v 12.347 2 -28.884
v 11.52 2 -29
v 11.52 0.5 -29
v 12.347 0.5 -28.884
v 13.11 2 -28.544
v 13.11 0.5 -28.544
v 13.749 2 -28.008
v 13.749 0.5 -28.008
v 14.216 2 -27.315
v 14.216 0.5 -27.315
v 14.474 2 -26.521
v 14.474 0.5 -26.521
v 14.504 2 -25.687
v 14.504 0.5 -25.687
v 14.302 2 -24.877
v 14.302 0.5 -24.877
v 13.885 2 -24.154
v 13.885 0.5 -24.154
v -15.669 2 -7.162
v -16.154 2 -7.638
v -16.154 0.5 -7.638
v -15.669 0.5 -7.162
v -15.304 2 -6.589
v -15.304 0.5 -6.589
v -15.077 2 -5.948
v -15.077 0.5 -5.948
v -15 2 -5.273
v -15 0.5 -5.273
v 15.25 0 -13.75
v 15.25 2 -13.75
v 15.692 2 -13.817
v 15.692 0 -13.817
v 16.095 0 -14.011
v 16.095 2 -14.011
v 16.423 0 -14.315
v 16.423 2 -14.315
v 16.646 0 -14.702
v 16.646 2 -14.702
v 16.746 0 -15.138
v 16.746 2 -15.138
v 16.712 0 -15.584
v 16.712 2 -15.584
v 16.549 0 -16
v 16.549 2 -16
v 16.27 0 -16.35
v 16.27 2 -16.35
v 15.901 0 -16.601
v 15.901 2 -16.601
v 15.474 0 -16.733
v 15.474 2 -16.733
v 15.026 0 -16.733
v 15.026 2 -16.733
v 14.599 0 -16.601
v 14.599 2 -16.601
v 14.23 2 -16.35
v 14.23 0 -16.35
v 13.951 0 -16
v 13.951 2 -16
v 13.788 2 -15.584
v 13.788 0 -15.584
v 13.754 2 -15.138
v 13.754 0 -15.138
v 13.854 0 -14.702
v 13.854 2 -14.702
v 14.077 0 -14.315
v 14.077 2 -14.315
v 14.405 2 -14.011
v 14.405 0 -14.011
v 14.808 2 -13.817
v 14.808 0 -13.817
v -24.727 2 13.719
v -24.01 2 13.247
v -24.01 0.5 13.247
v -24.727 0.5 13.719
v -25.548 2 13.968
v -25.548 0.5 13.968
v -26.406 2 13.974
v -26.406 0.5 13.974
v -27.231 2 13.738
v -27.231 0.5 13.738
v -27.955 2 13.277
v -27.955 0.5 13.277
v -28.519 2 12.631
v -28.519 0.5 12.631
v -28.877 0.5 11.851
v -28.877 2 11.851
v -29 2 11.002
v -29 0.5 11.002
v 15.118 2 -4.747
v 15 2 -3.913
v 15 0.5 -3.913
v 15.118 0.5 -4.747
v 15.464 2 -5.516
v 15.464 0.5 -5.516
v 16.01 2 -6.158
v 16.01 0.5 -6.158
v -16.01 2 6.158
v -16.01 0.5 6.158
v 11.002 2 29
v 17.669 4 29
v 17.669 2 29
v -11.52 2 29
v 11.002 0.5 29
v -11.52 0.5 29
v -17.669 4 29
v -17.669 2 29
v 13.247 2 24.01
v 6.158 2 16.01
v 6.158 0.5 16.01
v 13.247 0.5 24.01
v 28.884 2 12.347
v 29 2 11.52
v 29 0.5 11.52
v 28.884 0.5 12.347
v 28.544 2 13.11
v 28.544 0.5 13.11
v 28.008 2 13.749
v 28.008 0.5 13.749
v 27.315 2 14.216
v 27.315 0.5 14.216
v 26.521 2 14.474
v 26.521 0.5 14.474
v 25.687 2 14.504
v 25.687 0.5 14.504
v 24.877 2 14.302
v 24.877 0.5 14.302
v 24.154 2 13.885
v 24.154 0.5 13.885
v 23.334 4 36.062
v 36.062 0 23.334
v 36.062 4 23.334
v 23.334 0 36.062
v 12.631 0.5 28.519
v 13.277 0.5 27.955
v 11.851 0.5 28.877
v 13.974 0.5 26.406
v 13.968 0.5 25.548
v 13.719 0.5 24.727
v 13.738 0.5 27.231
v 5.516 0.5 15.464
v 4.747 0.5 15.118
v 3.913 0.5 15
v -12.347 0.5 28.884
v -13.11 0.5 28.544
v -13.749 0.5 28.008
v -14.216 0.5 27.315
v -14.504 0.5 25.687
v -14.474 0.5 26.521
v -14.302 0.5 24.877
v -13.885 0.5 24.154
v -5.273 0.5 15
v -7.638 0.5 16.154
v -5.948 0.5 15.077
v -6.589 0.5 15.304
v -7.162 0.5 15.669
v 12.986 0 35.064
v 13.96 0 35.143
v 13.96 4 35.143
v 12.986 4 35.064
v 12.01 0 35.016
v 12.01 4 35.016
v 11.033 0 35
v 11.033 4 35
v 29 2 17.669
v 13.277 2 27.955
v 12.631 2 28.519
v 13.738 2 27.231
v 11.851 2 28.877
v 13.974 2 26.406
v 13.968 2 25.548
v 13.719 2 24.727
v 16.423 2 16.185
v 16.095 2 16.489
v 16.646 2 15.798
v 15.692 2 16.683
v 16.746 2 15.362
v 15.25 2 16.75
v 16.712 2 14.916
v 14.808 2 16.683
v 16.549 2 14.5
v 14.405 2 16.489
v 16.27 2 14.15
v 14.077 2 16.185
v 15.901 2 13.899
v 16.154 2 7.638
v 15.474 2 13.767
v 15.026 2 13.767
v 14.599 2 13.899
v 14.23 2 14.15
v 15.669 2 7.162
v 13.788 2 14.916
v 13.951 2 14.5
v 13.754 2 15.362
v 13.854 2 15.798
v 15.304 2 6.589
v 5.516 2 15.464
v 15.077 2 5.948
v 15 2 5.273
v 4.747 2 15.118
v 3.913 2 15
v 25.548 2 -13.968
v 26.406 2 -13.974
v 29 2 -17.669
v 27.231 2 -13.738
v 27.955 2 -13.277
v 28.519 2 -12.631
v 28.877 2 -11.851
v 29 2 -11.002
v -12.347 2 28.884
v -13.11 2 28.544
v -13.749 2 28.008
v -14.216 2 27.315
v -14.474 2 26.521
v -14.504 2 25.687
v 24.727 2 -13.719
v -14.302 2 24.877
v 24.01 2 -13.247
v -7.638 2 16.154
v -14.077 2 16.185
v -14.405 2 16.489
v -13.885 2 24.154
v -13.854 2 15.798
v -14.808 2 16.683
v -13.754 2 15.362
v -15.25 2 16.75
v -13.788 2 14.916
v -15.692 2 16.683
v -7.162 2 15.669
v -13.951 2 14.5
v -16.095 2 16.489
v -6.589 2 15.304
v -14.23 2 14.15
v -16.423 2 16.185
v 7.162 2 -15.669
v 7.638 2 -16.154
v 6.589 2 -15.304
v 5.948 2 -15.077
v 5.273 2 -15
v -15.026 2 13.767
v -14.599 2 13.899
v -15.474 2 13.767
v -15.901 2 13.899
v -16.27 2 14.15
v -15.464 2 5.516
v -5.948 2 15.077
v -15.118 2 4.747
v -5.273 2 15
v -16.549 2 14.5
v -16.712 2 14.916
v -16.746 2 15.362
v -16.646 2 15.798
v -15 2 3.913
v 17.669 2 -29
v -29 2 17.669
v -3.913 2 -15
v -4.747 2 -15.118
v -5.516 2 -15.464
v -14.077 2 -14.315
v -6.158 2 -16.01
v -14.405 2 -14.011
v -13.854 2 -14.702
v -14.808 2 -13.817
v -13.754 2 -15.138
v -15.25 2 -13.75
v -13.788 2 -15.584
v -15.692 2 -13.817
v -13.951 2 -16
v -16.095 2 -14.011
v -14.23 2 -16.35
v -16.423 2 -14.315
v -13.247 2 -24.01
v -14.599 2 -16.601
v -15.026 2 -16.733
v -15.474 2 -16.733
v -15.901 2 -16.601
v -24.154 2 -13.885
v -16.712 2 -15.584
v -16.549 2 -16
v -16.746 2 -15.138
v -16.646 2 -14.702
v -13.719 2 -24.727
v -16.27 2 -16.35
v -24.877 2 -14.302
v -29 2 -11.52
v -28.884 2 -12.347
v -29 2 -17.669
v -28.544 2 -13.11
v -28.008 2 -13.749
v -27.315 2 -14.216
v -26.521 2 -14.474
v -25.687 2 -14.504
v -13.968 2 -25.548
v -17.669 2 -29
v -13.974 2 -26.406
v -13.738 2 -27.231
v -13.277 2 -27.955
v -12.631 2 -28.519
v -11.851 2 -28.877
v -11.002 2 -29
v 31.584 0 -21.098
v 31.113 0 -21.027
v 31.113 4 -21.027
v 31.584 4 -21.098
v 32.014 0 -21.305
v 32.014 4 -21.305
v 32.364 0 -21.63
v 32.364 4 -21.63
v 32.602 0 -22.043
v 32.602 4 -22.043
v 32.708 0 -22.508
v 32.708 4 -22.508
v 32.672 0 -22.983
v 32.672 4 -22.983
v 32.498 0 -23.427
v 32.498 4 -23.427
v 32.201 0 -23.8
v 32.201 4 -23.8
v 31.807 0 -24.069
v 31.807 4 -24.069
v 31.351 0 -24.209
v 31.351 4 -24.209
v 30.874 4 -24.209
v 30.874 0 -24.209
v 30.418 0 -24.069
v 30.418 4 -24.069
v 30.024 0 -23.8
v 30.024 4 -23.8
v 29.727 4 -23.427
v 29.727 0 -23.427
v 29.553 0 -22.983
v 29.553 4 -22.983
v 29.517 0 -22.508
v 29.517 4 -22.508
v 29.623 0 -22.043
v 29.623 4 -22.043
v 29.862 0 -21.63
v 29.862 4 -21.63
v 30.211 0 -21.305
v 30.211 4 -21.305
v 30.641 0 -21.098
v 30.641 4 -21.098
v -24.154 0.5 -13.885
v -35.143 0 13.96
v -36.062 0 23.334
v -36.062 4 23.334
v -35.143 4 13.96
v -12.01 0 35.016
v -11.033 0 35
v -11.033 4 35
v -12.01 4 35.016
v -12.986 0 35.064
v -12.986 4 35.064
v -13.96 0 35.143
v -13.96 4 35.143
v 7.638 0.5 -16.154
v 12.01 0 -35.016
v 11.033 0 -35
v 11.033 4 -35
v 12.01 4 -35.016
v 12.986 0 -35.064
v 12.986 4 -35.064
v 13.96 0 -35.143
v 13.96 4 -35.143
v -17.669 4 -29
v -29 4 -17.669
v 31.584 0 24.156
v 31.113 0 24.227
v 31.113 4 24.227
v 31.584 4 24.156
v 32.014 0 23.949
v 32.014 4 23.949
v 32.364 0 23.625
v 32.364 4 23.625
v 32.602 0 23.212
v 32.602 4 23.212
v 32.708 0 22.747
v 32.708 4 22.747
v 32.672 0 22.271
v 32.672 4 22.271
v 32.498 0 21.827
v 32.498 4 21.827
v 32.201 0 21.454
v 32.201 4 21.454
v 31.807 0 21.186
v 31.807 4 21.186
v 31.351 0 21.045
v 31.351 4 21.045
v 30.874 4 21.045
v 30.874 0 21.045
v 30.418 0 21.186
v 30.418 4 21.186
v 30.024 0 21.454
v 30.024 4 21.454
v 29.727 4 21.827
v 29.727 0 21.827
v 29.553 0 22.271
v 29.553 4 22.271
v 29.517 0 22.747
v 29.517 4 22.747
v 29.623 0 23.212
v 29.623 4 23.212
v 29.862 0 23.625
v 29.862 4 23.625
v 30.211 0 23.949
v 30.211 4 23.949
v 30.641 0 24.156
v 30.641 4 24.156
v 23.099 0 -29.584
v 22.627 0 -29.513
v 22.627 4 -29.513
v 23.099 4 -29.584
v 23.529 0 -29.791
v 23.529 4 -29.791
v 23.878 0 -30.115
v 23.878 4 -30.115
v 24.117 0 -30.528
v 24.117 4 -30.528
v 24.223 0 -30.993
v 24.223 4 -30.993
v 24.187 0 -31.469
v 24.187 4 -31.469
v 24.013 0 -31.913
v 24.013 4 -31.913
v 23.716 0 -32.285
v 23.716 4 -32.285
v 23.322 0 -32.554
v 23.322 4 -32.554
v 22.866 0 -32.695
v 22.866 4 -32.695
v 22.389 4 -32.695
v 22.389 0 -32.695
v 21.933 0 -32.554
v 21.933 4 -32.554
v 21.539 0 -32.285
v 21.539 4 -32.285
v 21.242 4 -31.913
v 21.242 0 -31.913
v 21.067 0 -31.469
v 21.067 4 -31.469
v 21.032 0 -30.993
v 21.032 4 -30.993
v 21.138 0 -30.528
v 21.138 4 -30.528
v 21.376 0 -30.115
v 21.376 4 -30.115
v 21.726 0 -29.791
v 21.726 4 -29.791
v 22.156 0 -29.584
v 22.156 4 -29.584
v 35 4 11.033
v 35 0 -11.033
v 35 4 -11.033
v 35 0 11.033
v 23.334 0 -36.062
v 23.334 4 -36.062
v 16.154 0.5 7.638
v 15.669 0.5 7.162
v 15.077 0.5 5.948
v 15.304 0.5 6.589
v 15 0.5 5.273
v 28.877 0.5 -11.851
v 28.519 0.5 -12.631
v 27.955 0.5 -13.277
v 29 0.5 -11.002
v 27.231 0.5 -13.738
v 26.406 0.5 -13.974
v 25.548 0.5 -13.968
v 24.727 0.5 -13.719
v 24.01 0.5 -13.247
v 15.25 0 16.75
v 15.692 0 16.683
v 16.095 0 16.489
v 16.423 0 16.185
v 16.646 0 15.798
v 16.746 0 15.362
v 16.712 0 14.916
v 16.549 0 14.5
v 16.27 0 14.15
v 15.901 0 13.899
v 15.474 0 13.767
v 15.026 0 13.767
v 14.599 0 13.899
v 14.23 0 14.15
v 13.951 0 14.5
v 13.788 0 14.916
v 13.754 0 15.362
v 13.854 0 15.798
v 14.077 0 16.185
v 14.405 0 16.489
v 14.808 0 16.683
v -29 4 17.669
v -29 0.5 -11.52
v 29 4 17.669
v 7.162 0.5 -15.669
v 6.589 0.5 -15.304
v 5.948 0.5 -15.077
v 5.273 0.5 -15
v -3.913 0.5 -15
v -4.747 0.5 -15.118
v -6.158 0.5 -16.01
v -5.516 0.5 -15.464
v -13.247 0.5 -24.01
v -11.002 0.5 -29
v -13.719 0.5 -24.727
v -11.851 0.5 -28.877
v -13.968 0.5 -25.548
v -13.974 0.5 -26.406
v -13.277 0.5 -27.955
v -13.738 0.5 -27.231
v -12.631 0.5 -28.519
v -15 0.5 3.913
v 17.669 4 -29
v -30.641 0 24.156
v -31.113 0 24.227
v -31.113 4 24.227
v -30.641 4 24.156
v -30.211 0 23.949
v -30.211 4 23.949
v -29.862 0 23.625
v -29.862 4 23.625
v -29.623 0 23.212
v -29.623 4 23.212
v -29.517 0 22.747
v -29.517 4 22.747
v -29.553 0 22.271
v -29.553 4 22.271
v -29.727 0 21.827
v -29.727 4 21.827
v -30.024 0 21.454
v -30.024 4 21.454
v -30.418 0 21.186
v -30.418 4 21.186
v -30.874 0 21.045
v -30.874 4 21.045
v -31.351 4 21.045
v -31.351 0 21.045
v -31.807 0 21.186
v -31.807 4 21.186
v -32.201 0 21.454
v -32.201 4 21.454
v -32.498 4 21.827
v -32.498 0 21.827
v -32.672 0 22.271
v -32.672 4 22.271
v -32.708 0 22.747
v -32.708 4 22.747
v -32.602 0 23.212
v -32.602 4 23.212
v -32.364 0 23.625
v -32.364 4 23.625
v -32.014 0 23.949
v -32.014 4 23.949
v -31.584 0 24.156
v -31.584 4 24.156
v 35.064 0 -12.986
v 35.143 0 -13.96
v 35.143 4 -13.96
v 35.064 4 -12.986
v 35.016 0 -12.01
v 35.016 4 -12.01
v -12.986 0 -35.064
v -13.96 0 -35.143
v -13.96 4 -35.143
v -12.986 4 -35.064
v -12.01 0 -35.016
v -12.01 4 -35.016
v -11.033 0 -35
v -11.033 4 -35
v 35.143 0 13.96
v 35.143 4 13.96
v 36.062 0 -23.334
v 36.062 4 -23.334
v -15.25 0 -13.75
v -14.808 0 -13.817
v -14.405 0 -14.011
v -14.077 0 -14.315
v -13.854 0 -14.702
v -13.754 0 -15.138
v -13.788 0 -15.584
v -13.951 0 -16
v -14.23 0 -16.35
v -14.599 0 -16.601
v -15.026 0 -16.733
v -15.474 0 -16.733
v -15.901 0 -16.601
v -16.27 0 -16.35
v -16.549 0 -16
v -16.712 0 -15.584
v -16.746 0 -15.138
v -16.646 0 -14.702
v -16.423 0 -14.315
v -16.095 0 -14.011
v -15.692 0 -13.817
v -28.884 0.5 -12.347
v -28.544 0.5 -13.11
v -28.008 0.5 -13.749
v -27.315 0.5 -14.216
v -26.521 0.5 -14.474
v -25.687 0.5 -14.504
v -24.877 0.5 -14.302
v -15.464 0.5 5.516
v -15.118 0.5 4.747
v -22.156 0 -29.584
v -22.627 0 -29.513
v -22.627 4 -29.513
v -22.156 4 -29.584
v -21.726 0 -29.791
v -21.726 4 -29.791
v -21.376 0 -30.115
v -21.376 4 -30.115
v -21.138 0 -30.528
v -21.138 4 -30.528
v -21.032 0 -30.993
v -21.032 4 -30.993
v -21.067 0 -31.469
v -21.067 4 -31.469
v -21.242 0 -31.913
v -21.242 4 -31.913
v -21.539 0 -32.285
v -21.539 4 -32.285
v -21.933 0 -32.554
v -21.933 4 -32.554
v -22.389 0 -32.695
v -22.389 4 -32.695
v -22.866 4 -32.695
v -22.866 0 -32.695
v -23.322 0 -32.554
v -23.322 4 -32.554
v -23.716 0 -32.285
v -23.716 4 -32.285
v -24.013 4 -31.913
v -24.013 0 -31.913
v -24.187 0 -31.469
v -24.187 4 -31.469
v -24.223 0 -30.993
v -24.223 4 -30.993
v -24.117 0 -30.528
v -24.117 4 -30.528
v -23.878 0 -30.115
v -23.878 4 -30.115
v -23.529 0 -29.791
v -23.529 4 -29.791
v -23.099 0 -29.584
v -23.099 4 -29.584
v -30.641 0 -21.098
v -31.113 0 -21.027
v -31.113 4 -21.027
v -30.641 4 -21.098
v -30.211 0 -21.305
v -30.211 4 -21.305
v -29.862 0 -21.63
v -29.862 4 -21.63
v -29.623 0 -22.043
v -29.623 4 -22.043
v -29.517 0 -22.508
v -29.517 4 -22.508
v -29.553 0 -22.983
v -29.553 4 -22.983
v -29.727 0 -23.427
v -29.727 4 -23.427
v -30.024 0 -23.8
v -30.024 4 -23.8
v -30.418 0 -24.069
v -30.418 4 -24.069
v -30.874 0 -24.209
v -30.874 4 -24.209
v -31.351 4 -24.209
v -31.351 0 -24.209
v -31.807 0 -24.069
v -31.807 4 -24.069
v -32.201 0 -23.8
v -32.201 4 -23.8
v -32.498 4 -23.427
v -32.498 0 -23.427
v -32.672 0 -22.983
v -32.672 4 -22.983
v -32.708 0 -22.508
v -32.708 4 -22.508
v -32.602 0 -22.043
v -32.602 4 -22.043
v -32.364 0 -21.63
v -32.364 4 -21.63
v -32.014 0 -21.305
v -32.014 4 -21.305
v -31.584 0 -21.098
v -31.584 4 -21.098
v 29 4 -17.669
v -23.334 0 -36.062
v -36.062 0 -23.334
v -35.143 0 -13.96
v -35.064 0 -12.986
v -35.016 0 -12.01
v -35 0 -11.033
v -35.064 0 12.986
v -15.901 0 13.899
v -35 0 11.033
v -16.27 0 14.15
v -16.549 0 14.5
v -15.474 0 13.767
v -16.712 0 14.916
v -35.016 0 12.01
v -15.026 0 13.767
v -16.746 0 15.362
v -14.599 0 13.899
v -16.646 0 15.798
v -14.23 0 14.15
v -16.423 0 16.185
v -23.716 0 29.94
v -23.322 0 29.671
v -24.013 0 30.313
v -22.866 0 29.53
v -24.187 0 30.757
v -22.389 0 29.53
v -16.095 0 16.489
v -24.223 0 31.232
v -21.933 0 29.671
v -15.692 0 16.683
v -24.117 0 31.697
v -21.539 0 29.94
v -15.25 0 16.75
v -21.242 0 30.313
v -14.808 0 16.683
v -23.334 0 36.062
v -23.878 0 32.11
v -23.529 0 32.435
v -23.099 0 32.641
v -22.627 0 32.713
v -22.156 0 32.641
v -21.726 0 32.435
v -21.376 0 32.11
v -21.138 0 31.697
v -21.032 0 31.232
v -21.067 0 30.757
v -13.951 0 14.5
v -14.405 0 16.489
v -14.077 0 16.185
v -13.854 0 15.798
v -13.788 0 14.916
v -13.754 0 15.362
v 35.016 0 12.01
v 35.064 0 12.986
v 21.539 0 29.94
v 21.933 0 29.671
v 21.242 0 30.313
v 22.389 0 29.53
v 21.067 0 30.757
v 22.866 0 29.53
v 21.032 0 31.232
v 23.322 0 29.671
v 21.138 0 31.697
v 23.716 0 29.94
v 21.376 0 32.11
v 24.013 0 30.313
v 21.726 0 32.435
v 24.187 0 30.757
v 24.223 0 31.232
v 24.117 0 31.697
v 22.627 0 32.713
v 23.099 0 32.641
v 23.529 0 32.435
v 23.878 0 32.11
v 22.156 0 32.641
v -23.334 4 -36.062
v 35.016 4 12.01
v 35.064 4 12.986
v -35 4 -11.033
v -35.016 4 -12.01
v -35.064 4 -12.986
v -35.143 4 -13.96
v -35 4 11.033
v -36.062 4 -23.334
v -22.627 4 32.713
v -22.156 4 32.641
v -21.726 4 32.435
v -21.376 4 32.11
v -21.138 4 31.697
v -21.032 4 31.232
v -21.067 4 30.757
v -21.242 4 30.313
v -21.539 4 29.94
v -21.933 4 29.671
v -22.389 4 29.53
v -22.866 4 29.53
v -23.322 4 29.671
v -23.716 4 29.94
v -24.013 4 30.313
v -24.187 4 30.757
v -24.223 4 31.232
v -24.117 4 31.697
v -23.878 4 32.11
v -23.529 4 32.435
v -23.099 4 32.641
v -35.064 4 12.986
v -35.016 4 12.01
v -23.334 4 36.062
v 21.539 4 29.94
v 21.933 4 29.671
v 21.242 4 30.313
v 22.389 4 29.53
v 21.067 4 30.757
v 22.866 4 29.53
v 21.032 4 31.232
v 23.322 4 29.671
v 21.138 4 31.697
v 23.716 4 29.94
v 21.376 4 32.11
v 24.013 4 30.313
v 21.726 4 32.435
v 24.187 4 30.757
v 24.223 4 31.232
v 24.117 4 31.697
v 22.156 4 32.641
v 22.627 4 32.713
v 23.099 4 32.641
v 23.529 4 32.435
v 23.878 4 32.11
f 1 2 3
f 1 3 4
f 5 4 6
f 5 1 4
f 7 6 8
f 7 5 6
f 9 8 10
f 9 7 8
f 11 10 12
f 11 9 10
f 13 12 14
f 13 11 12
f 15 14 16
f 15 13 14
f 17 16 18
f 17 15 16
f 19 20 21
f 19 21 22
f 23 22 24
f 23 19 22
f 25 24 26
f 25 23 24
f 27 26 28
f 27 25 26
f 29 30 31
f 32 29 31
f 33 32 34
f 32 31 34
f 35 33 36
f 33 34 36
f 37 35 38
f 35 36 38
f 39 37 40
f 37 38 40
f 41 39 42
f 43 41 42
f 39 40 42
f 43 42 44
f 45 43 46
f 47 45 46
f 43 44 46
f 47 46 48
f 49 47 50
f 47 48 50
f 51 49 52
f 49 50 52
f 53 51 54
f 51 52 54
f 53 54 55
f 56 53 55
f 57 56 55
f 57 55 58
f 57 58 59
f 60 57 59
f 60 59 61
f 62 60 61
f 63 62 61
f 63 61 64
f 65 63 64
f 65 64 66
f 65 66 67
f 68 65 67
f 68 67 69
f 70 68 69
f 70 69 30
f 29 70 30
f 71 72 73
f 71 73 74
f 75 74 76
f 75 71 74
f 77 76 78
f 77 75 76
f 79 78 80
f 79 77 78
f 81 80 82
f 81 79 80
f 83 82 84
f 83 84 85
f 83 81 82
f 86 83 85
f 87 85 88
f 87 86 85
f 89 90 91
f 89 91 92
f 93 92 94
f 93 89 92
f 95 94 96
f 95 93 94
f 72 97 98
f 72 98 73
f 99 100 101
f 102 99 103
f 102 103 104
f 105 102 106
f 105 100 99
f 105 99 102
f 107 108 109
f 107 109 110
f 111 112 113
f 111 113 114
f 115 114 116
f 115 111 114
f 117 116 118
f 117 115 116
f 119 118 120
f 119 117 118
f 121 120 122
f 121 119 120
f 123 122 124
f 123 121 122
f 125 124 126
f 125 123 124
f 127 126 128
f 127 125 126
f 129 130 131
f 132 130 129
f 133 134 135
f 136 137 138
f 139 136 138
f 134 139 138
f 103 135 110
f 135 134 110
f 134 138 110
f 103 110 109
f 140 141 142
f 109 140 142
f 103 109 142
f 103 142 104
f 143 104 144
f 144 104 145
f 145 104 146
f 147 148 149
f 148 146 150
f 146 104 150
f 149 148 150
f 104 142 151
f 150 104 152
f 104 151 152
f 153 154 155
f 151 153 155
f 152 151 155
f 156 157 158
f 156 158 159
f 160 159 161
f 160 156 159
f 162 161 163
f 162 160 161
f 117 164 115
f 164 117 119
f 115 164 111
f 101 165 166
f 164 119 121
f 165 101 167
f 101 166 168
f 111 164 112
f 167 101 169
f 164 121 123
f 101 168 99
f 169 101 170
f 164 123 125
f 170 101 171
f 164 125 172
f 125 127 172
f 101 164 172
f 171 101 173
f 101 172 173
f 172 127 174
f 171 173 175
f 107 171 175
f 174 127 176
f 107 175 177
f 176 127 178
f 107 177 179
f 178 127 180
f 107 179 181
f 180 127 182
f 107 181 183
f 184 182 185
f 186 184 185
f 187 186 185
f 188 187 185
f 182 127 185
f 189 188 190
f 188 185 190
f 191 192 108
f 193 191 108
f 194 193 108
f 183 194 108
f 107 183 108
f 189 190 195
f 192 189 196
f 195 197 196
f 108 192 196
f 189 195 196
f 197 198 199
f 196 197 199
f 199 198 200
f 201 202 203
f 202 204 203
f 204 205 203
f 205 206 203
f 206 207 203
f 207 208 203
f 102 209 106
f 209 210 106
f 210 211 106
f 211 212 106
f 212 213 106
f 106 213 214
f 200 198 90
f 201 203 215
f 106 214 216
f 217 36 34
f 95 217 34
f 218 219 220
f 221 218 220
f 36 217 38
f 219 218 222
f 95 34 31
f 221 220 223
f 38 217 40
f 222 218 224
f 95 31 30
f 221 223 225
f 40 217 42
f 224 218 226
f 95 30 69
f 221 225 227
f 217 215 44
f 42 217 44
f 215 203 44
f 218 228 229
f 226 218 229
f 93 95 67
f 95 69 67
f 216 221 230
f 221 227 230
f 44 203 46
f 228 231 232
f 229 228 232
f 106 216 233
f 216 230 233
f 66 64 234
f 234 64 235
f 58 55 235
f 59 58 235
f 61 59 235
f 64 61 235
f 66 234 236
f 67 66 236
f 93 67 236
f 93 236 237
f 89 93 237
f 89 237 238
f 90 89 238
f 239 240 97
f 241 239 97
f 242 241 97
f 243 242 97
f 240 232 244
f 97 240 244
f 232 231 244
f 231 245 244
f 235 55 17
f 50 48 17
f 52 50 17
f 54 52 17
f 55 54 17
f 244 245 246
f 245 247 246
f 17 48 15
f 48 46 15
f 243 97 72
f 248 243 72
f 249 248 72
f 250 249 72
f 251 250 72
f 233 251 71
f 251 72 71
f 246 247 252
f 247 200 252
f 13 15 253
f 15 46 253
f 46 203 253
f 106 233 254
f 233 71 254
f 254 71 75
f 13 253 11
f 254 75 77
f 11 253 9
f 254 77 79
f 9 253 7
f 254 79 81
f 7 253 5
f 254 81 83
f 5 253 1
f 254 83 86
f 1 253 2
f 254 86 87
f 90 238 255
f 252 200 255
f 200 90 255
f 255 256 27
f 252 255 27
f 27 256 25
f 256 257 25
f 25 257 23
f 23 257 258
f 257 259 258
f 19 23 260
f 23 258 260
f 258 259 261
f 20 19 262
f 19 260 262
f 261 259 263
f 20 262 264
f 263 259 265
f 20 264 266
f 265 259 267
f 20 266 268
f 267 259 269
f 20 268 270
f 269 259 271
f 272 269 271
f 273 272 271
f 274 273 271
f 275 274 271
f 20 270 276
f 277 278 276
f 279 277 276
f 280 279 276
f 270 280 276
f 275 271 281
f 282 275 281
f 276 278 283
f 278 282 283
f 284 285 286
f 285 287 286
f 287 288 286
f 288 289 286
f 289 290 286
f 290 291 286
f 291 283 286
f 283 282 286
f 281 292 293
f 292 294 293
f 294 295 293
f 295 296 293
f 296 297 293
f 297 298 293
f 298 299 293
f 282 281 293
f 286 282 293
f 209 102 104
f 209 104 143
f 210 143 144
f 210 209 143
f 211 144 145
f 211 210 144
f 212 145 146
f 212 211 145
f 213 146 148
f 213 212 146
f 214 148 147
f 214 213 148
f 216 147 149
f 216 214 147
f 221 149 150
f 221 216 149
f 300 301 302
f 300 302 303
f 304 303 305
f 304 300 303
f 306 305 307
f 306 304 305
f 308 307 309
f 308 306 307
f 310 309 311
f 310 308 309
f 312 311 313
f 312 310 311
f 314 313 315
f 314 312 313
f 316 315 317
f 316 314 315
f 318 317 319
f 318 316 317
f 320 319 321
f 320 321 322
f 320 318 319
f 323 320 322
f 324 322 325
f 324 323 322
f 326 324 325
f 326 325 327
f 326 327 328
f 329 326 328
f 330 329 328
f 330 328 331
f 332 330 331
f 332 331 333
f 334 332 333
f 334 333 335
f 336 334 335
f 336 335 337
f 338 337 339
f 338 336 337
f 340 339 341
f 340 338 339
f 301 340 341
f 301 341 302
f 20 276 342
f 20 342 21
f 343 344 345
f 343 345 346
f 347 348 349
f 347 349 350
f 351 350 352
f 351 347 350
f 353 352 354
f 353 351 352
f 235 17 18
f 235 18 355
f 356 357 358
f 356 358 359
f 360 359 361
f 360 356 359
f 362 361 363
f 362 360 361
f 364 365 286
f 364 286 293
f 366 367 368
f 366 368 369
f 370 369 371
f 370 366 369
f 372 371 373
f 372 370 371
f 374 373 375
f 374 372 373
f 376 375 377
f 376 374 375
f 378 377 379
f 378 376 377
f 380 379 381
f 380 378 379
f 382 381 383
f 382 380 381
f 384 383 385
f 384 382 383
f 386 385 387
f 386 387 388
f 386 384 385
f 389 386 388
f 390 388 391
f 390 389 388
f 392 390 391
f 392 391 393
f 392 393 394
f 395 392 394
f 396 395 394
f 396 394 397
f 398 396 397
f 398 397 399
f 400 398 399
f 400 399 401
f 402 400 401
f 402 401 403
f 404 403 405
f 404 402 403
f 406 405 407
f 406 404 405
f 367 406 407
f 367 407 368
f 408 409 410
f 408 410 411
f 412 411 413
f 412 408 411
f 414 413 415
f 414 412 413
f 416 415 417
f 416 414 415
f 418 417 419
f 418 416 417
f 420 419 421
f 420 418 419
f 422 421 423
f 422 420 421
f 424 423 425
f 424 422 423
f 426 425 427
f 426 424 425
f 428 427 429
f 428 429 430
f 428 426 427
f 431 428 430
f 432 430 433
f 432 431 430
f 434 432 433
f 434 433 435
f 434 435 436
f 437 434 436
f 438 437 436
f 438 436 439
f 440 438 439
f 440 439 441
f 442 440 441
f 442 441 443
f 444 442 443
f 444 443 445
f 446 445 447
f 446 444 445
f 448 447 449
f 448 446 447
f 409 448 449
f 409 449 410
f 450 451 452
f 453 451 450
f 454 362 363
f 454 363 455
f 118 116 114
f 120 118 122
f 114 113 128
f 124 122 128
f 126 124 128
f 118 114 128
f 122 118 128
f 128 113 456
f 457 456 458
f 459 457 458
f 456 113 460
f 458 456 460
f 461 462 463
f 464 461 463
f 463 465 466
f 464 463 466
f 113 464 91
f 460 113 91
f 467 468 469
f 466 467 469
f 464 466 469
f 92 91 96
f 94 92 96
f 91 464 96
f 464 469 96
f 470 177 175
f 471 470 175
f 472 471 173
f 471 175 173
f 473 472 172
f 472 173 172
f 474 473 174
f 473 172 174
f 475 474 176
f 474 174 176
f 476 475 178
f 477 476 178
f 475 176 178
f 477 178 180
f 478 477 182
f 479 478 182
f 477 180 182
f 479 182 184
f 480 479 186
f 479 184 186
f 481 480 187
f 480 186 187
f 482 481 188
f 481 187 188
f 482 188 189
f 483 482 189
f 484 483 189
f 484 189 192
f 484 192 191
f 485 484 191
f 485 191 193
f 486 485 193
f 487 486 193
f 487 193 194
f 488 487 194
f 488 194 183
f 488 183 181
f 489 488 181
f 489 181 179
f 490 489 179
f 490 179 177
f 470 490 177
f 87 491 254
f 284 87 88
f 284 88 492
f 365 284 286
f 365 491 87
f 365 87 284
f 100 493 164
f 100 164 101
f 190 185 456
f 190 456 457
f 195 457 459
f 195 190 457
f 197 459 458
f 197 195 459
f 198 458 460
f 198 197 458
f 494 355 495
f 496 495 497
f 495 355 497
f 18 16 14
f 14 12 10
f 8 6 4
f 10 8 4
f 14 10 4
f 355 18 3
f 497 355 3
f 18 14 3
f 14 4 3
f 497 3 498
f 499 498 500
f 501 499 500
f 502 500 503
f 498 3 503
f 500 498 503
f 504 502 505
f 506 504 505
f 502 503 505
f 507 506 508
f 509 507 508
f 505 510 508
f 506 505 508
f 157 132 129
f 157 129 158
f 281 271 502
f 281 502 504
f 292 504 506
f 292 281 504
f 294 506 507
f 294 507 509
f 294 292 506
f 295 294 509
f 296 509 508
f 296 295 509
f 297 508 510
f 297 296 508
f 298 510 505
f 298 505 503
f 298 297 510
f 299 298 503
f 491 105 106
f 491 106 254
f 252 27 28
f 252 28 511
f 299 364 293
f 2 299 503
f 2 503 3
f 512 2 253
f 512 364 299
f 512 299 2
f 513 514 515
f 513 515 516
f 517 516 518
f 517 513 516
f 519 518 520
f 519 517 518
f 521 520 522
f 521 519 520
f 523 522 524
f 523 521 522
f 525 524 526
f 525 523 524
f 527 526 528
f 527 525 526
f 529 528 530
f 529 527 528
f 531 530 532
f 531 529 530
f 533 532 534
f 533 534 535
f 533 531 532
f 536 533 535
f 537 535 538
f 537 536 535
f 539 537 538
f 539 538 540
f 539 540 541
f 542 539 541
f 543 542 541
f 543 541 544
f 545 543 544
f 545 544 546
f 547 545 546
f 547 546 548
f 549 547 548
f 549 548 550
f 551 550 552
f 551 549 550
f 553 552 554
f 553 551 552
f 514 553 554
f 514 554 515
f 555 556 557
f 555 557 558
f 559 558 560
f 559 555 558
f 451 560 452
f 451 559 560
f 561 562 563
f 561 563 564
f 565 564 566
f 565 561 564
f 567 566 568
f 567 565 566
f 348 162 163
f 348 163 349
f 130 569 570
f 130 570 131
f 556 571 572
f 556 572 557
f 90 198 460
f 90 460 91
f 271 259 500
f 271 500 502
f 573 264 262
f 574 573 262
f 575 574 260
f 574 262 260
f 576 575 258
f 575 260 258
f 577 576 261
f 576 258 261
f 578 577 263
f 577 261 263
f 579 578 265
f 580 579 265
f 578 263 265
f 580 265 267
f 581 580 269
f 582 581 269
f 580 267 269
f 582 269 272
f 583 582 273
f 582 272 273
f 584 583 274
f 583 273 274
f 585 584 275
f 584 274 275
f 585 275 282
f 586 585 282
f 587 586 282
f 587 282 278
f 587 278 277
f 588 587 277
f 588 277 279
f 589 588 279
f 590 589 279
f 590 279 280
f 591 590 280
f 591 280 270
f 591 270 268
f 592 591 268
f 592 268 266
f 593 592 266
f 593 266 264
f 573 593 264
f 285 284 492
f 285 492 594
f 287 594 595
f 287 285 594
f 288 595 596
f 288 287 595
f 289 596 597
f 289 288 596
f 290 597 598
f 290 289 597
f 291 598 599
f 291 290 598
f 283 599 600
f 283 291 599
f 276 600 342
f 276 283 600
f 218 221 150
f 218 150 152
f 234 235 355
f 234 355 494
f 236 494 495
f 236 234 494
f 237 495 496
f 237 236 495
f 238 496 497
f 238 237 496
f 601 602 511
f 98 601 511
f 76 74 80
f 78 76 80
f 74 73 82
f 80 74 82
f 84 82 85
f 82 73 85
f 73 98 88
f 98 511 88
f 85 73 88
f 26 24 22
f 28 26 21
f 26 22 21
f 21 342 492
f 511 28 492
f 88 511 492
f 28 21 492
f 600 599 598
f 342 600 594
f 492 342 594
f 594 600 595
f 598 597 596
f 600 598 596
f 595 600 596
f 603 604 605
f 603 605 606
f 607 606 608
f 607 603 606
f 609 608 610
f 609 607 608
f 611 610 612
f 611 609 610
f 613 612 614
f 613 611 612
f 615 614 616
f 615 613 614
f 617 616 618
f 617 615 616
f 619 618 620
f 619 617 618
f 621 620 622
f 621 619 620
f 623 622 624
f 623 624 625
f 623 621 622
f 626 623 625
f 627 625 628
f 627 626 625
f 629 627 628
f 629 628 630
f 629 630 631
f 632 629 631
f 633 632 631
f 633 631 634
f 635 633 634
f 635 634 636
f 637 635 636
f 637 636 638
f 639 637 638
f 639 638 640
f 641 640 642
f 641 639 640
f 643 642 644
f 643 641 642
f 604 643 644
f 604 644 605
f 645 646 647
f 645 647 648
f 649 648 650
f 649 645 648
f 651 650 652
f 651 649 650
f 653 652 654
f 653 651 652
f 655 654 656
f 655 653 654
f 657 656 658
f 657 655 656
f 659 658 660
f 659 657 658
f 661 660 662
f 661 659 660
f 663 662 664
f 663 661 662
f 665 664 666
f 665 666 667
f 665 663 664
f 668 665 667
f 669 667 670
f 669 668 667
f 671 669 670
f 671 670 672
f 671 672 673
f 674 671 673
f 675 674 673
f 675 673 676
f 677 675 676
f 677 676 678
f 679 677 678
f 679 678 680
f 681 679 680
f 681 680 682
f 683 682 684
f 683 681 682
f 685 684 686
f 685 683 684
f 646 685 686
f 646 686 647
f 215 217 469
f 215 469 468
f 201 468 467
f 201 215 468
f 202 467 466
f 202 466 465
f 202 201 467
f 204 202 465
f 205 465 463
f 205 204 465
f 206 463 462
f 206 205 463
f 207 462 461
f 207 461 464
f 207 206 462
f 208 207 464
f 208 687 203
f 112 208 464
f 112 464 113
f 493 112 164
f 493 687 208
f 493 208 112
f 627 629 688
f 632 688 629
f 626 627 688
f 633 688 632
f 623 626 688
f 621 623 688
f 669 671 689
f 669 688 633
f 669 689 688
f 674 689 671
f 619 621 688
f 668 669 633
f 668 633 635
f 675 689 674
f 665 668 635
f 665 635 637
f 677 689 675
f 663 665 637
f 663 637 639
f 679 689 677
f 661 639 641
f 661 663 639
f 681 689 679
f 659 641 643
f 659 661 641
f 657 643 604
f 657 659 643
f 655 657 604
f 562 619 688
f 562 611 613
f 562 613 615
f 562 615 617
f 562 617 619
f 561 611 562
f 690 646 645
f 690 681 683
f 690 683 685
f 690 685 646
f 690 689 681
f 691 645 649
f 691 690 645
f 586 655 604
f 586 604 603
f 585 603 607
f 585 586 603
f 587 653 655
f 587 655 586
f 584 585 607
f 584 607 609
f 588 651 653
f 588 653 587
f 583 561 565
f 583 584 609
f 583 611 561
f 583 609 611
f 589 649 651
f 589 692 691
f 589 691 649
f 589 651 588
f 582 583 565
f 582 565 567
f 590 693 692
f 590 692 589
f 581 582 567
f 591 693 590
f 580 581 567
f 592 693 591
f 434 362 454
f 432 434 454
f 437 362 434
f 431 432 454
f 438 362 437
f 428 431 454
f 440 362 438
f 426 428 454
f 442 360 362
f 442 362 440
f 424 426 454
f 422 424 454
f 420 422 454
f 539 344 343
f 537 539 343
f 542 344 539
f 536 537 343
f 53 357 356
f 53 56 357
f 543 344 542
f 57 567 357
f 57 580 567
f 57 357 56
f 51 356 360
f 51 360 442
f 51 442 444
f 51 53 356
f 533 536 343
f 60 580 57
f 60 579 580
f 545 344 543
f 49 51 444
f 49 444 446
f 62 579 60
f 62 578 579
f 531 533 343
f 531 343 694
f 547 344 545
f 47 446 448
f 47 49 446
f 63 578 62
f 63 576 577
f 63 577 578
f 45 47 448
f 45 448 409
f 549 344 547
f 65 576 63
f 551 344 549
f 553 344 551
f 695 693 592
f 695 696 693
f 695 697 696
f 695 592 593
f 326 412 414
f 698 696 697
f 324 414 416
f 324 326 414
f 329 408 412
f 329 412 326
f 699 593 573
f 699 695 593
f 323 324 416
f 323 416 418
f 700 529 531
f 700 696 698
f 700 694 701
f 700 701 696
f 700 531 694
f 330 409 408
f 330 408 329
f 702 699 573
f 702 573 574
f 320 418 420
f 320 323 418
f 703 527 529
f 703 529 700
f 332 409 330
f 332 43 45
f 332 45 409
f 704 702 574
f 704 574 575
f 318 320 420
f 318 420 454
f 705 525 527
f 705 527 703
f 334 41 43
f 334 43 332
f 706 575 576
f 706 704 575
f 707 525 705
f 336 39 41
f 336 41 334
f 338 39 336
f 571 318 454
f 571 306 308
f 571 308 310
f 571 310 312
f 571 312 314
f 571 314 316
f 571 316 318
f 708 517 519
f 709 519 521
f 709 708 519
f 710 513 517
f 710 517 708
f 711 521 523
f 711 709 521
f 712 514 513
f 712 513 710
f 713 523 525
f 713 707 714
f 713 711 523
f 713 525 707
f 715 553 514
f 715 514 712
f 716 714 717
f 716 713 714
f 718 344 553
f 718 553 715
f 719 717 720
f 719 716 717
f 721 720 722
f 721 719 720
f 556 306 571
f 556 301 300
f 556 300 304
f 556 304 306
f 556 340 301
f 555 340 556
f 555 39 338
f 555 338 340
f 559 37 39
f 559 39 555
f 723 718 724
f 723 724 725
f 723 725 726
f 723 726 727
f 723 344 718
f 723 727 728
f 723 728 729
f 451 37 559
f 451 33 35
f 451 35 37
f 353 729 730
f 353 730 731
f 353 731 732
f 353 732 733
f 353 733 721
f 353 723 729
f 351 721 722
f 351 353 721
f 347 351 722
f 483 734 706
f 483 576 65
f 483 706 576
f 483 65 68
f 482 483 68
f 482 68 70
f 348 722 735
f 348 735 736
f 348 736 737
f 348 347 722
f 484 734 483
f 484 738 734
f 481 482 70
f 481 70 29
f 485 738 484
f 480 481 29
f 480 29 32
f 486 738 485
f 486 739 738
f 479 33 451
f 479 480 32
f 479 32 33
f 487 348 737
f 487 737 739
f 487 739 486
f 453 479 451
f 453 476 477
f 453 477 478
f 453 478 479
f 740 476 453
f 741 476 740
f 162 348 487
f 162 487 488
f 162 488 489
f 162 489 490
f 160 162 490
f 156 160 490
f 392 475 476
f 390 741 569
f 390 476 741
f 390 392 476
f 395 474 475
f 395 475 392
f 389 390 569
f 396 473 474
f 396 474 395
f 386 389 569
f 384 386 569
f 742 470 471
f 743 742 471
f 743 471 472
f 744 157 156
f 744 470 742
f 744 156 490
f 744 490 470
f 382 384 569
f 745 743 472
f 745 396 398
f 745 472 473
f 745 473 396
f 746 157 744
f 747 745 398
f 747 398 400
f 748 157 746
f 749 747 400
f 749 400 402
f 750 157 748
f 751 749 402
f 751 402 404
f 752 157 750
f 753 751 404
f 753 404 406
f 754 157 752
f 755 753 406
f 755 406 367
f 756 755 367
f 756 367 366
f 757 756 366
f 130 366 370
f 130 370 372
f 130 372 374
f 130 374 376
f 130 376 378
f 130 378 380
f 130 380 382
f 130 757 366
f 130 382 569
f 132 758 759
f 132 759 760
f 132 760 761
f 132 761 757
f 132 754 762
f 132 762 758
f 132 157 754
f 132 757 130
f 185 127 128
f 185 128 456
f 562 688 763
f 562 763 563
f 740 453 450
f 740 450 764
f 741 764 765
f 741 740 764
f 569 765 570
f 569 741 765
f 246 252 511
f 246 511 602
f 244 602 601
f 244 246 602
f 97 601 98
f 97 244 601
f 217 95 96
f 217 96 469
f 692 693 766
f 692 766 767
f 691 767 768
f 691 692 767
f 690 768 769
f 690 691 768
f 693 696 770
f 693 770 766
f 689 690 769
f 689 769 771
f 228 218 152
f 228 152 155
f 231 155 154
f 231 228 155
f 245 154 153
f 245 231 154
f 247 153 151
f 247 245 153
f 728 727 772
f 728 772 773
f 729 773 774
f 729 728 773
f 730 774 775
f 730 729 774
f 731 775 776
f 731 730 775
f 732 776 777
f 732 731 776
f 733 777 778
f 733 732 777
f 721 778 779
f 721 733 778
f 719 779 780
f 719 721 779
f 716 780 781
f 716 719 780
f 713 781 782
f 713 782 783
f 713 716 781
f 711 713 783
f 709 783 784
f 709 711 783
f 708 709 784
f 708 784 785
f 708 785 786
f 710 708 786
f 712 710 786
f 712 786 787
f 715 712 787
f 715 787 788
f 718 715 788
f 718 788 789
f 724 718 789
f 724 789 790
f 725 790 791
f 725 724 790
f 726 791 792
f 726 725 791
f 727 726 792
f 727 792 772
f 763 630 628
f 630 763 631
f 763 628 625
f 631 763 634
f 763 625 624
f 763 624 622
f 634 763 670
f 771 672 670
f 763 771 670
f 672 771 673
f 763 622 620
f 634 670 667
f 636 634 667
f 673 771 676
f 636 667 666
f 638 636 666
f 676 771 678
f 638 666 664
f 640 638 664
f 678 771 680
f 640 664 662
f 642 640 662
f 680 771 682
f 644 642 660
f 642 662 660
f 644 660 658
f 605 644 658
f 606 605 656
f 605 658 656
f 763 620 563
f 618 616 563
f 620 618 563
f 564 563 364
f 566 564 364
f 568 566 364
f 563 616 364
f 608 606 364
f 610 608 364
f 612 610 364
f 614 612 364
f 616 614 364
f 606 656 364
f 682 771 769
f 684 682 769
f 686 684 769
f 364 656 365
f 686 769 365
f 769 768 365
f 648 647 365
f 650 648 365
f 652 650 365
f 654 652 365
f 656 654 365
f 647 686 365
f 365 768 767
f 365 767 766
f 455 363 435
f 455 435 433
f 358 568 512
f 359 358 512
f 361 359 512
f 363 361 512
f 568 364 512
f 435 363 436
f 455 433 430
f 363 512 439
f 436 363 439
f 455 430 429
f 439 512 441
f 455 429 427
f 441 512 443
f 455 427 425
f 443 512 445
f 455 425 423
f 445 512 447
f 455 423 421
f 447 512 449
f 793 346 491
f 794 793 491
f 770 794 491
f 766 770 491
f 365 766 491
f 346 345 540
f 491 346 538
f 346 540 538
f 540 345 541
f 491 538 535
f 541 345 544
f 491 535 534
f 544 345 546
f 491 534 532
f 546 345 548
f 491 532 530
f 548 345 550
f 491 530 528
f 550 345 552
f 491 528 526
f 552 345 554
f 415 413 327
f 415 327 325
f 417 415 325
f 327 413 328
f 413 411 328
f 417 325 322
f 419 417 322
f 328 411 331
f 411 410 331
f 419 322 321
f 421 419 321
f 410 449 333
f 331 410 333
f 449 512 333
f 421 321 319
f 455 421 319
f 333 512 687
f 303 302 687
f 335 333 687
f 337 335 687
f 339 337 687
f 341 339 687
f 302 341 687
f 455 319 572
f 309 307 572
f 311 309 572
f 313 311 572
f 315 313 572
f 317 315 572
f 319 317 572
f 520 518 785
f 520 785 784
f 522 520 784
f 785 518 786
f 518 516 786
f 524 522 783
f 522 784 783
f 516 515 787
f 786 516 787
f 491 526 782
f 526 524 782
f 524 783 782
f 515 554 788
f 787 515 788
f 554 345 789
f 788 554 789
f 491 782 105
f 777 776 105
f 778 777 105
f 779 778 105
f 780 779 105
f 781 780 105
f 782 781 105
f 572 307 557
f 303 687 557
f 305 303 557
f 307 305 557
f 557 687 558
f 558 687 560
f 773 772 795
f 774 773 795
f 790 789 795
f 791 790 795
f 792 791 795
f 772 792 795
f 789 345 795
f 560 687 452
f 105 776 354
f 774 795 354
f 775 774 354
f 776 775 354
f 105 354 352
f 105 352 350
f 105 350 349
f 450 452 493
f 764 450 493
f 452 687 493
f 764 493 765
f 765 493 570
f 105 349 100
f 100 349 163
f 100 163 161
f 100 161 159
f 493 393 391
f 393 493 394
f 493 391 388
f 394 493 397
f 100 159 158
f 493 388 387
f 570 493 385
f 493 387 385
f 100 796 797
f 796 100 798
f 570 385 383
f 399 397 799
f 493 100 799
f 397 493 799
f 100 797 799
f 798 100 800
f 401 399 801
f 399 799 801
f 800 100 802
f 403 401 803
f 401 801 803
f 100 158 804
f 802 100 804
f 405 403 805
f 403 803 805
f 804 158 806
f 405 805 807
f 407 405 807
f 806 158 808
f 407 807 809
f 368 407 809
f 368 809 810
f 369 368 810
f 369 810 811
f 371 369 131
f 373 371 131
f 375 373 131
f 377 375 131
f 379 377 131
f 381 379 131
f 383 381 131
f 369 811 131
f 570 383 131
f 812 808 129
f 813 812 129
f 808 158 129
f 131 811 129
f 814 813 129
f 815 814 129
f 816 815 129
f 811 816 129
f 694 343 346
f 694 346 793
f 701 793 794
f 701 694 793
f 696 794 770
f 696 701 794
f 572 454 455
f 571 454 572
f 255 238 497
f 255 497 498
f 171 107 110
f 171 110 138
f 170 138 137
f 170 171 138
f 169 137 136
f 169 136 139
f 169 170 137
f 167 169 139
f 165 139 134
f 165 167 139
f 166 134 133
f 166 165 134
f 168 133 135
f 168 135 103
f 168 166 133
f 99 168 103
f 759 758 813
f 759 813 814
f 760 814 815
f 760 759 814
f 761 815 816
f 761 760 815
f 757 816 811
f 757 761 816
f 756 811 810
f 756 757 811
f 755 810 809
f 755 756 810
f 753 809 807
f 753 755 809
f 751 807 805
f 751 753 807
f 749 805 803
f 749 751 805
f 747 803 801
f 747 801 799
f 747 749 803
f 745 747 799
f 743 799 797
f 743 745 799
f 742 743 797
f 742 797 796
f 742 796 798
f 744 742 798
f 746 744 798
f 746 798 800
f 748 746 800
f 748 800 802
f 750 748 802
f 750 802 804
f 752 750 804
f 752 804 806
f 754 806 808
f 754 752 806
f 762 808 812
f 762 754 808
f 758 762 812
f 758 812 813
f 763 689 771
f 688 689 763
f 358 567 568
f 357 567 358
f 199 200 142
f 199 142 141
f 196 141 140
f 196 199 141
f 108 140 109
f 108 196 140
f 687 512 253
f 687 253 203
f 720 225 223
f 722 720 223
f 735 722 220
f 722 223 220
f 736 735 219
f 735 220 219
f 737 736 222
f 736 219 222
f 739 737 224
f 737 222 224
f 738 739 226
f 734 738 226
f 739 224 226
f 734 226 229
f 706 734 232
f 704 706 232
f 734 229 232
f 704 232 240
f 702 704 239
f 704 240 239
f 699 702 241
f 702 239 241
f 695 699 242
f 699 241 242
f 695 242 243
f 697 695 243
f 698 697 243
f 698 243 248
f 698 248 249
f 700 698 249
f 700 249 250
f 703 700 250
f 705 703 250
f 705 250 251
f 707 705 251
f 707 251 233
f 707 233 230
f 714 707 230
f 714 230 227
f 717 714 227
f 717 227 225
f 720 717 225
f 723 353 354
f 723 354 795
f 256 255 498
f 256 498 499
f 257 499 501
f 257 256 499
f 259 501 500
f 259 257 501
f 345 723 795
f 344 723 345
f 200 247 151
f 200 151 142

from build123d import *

# Parameters (mm, degrees)
SKETCH1_R           = 1.6
BOSS_EXTRUDE1_DEPTH = 4
CUT_EXTRUDE1_DEPTH  = 2
CUT_EXTRUDE2_DEPTH  = 1.5
SKETCH5_R           = 1.5
CUT_EXTRUDE3_DEPTH  = 52.039025935
FILLET1_R           = 30


with BuildPart() as part:
    # Sketch1 → Boss-Extrude1 (new body)
    with BuildSketch(Plane(origin=(0, 0, 0), x_dir=(1, 0, 0), z_dir=(0, 1, 0))):
        Polygon((-35, 12.5), (-36.062322224, 23.334400163), (-23.334400163, 36.062322224), (-12.5, 35), (12.5, 35), (23.334400163, 36.062322224), (36.062322224, 23.334400163), (35, 12.5), (35, -12.5), (36.062322224, -23.334400163), (23.334400163, -36.062322224), (12.5, -35), (-12.5, -35), (-23.334400163, -36.062322224), (-36.062322224, -23.334400163), (-35, -12.5), align=None)
        with Locations(Location((31.112574756, 22.627293382, 0), (0, 0, 270))):
            Circle(SKETCH1_R, mode=Mode.SUBTRACT)
        with Locations(Location((22.627293382, 31.112574756, 0), (0, 0, 270))):
            Circle(SKETCH1_R, mode=Mode.SUBTRACT)
        with Locations(Location((31.112574756, -22.627293382, 0), (0, 0, 270))):
            Circle(SKETCH1_R, mode=Mode.SUBTRACT)
        with Locations(Location((22.627293382, -31.112574756, 0), (0, 0, 270))):
            Circle(SKETCH1_R, mode=Mode.SUBTRACT)
        with Locations(Location((-22.627293382, -31.112574756, 0), (0, 0, 270))):
            Circle(SKETCH1_R, mode=Mode.SUBTRACT)
        with Locations(Location((-31.112574756, -22.627293382, 0), (0, 0, 270))):
            Circle(SKETCH1_R, mode=Mode.SUBTRACT)
        with Locations(Location((-31.112574756, 22.627293382, 0), (0, 0, 270))):
            Circle(SKETCH1_R, mode=Mode.SUBTRACT)
        with Locations(Location((-22.627293382, 31.112574756, 0), (0, 0, 270))):
            Circle(SKETCH1_R, mode=Mode.SUBTRACT)
    extrude(amount=BOSS_EXTRUDE1_DEPTH)

    # Sketch3 → Cut-Extrude1 (cut)
    with BuildSketch(Plane(origin=(0, 4, 0), x_dir=(1, 0, 0), z_dir=(0, 1, 0))):
        Polygon((-17.668800325, 29), (17.668800325, 29), (29, 17.668800325), (29, -17.668800325), (17.668800325, -29), (-17.668800325, -29), (-29, -17.668800325), (-29, 17.668800325), align=None)
    extrude(amount=-CUT_EXTRUDE1_DEPTH, mode=Mode.SUBTRACT)

    # Sketch4 → Cut-Extrude2 (cut)
    with BuildSketch(Plane(origin=(0, 2, 0), x_dir=(1, 0, 0), z_dir=(0, 1, 0))):
        with BuildLine():
            Line((-29, -11.00200097), (-29, 11.520078787))
            ThreePointArc((-29, 11.520078787), (-27.315491792, 14.216276359), (-24.153679103, 13.884629304))
            Line((-24.153679103, 13.884629304), (-16.153679103, 7.637959136))
            ThreePointArc((-16.153679103, 7.637959136), (-15.303802428, 6.588900412), (-15, 5.273408619))
            Line((-15, 5.273408619), (-15, -3.912899337))
            ThreePointArc((-15, -3.912899337), (-15.264226315, -5.143972993), (-16.010361564, -6.158191945))
            Line((-16.010361564, -6.158191945), (-24.010361564, -13.247293577))
            ThreePointArc((-24.010361564, -13.247293577), (-27.231073656, -13.737774655), (-29, -11.00200097))
        make_face()
        with BuildLine():
            Line((13.884629304, 24.153679103), (7.637959136, 16.153679103))
            ThreePointArc((7.637959136, 16.153679103), (6.588900412, 15.303802428), (5.273408619, 15))
            Line((5.273408619, 15), (-3.912899337, 15))
            ThreePointArc((-3.912899337, 15), (-5.143972993, 15.264226315), (-6.158191945, 16.010361564))
            Line((-6.158191945, 16.010361564), (-13.247293578, 24.010361564))
            ThreePointArc((-13.247293578, 24.010361564), (-13.737774655, 27.231073656), (-11.00200097, 29))
            Line((-11.00200097, 29), (11.520078787, 29))
            ThreePointArc((11.520078787, 29), (14.216276359, 27.315491792), (13.884629304, 24.153679103))
        make_face()
        with BuildLine():
            Line((24.153679103, -13.884629304), (16.153679103, -7.637959136))
            ThreePointArc((16.153679103, -7.637959136), (15.303802428, -6.588900412), (15, -5.273408619))
            Line((15, -5.273408619), (15, 3.912899337))
            ThreePointArc((15, 3.912899337), (15.264226315, 5.143972993), (16.010361564, 6.158191945))
            Line((16.010361564, 6.158191945), (24.010361564, 13.247293578))
            ThreePointArc((24.010361564, 13.247293578), (27.231073656, 13.737774655), (29, 11.00200097))
            Line((29, 11.00200097), (29, -11.520078787))
            ThreePointArc((29, -11.520078787), (27.315491792, -14.216276359), (24.153679103, -13.884629304))
        make_face()
        with BuildLine():
            Line((-13.884629304, -24.153679103), (-7.637959136, -16.153679103))
            ThreePointArc((-7.637959136, -16.153679103), (-6.588900412, -15.303802428), (-5.273408619, -15))
            Line((-5.273408619, -15), (3.912899337, -15))
            ThreePointArc((3.912899337, -15), (5.143972993, -15.264226315), (6.158191945, -16.010361564))
            Line((6.158191945, -16.010361564), (13.247293578, -24.010361564))
            ThreePointArc((13.247293578, -24.010361564), (13.737774655, -27.231073656), (11.00200097, -29))
            Line((11.00200097, -29), (-11.520078787, -29))
            ThreePointArc((-11.520078787, -29), (-14.216276359, -27.315491792), (-13.884629304, -24.153679103))
        make_face()
    extrude(amount=-CUT_EXTRUDE2_DEPTH, mode=Mode.SUBTRACT)

    # Sketch5 → Cut-Extrude3 (cut, through all)
    with BuildSketch(Plane(origin=(0, 2, 0), x_dir=(1, 0, 0), z_dir=(0, 1, 0))):
        with Locations(Location((15.25, 15.25, 0), (0, 0, 270))):
            Circle(SKETCH5_R)
        with Locations(Location((15.25, -15.25, 0), (0, 0, 270))):
            Circle(SKETCH5_R)
        with Locations(Location((-15.25, -15.25, 0), (0, 0, 270))):
            Circle(SKETCH5_R)
        with Locations(Location((-15.25, 15.25, 0), (0, 0, 270))):
            Circle(SKETCH5_R)
    extrude(amount=-CUT_EXTRUDE3_DEPTH, mode=Mode.SUBTRACT)

    # Fillet1
    # the kernel refuses this fillet: 30 mm, written as the material it adds along each edge
    with BuildSketch(Plane(origin=(-35, 0, -12.5), x_dir=(-0.09758289975914561, 0, -0.9952273999818315), z_dir=(0, 1, 0)), Plane(origin=(12.5, 0, 35), x_dir=(-1, 0, 0), z_dir=(0, 1, 0)), Plane(origin=(-12.5, 0, 35), x_dir=(-0.9952273999818316, 0, 0.09758289975914514), z_dir=(0, 1, 0)), Plane(origin=(-35, 0, 12.5), x_dir=(0, 0, -1), z_dir=(0, 1, 0))) as fillet1_piece_1:
        with BuildLine():
            CenterArc((FILLET1_R * 0.0489081594208, FILLET1_R), FILLET1_R, 264.4, 5.6)
            Line((-FILLET1_R * 0.0486747403383, FILLET1_R * 0.00477260001817), (0, 0))
            Line((0, 0), (FILLET1_R * 0.0489081594208, 0))
        make_face()
    extrude(amount=4)
    with BuildSketch(Plane(origin=(-12.5, 0, -35), x_dir=(-0.9952273999818313, 0, -0.09758289975914779), z_dir=(0, 1, 0)), Plane(origin=(12.5, 0, -35), x_dir=(-1, 0, 0), z_dir=(0, 1, 0)), Plane(origin=(35, 0, -12.5), x_dir=(0.0975828997591479, 0, -0.9952273999818313), z_dir=(0, 1, 0)), Plane(origin=(35, 0, 12.5), x_dir=(0, 0, -1), z_dir=(0, 1, 0))) as fillet1_piece_2:
        with BuildLine():
            CenterArc((FILLET1_R * 0.0489081594208, -FILLET1_R), FILLET1_R, 90, 5.6)
            Line((-FILLET1_R * 0.0486747403383, -FILLET1_R * 0.00477260001817), (0, 0))
            Line((0, 0), (FILLET1_R * 0.0489081594208, 0))
        make_face()
    extrude(amount=4)


solid = part.part
